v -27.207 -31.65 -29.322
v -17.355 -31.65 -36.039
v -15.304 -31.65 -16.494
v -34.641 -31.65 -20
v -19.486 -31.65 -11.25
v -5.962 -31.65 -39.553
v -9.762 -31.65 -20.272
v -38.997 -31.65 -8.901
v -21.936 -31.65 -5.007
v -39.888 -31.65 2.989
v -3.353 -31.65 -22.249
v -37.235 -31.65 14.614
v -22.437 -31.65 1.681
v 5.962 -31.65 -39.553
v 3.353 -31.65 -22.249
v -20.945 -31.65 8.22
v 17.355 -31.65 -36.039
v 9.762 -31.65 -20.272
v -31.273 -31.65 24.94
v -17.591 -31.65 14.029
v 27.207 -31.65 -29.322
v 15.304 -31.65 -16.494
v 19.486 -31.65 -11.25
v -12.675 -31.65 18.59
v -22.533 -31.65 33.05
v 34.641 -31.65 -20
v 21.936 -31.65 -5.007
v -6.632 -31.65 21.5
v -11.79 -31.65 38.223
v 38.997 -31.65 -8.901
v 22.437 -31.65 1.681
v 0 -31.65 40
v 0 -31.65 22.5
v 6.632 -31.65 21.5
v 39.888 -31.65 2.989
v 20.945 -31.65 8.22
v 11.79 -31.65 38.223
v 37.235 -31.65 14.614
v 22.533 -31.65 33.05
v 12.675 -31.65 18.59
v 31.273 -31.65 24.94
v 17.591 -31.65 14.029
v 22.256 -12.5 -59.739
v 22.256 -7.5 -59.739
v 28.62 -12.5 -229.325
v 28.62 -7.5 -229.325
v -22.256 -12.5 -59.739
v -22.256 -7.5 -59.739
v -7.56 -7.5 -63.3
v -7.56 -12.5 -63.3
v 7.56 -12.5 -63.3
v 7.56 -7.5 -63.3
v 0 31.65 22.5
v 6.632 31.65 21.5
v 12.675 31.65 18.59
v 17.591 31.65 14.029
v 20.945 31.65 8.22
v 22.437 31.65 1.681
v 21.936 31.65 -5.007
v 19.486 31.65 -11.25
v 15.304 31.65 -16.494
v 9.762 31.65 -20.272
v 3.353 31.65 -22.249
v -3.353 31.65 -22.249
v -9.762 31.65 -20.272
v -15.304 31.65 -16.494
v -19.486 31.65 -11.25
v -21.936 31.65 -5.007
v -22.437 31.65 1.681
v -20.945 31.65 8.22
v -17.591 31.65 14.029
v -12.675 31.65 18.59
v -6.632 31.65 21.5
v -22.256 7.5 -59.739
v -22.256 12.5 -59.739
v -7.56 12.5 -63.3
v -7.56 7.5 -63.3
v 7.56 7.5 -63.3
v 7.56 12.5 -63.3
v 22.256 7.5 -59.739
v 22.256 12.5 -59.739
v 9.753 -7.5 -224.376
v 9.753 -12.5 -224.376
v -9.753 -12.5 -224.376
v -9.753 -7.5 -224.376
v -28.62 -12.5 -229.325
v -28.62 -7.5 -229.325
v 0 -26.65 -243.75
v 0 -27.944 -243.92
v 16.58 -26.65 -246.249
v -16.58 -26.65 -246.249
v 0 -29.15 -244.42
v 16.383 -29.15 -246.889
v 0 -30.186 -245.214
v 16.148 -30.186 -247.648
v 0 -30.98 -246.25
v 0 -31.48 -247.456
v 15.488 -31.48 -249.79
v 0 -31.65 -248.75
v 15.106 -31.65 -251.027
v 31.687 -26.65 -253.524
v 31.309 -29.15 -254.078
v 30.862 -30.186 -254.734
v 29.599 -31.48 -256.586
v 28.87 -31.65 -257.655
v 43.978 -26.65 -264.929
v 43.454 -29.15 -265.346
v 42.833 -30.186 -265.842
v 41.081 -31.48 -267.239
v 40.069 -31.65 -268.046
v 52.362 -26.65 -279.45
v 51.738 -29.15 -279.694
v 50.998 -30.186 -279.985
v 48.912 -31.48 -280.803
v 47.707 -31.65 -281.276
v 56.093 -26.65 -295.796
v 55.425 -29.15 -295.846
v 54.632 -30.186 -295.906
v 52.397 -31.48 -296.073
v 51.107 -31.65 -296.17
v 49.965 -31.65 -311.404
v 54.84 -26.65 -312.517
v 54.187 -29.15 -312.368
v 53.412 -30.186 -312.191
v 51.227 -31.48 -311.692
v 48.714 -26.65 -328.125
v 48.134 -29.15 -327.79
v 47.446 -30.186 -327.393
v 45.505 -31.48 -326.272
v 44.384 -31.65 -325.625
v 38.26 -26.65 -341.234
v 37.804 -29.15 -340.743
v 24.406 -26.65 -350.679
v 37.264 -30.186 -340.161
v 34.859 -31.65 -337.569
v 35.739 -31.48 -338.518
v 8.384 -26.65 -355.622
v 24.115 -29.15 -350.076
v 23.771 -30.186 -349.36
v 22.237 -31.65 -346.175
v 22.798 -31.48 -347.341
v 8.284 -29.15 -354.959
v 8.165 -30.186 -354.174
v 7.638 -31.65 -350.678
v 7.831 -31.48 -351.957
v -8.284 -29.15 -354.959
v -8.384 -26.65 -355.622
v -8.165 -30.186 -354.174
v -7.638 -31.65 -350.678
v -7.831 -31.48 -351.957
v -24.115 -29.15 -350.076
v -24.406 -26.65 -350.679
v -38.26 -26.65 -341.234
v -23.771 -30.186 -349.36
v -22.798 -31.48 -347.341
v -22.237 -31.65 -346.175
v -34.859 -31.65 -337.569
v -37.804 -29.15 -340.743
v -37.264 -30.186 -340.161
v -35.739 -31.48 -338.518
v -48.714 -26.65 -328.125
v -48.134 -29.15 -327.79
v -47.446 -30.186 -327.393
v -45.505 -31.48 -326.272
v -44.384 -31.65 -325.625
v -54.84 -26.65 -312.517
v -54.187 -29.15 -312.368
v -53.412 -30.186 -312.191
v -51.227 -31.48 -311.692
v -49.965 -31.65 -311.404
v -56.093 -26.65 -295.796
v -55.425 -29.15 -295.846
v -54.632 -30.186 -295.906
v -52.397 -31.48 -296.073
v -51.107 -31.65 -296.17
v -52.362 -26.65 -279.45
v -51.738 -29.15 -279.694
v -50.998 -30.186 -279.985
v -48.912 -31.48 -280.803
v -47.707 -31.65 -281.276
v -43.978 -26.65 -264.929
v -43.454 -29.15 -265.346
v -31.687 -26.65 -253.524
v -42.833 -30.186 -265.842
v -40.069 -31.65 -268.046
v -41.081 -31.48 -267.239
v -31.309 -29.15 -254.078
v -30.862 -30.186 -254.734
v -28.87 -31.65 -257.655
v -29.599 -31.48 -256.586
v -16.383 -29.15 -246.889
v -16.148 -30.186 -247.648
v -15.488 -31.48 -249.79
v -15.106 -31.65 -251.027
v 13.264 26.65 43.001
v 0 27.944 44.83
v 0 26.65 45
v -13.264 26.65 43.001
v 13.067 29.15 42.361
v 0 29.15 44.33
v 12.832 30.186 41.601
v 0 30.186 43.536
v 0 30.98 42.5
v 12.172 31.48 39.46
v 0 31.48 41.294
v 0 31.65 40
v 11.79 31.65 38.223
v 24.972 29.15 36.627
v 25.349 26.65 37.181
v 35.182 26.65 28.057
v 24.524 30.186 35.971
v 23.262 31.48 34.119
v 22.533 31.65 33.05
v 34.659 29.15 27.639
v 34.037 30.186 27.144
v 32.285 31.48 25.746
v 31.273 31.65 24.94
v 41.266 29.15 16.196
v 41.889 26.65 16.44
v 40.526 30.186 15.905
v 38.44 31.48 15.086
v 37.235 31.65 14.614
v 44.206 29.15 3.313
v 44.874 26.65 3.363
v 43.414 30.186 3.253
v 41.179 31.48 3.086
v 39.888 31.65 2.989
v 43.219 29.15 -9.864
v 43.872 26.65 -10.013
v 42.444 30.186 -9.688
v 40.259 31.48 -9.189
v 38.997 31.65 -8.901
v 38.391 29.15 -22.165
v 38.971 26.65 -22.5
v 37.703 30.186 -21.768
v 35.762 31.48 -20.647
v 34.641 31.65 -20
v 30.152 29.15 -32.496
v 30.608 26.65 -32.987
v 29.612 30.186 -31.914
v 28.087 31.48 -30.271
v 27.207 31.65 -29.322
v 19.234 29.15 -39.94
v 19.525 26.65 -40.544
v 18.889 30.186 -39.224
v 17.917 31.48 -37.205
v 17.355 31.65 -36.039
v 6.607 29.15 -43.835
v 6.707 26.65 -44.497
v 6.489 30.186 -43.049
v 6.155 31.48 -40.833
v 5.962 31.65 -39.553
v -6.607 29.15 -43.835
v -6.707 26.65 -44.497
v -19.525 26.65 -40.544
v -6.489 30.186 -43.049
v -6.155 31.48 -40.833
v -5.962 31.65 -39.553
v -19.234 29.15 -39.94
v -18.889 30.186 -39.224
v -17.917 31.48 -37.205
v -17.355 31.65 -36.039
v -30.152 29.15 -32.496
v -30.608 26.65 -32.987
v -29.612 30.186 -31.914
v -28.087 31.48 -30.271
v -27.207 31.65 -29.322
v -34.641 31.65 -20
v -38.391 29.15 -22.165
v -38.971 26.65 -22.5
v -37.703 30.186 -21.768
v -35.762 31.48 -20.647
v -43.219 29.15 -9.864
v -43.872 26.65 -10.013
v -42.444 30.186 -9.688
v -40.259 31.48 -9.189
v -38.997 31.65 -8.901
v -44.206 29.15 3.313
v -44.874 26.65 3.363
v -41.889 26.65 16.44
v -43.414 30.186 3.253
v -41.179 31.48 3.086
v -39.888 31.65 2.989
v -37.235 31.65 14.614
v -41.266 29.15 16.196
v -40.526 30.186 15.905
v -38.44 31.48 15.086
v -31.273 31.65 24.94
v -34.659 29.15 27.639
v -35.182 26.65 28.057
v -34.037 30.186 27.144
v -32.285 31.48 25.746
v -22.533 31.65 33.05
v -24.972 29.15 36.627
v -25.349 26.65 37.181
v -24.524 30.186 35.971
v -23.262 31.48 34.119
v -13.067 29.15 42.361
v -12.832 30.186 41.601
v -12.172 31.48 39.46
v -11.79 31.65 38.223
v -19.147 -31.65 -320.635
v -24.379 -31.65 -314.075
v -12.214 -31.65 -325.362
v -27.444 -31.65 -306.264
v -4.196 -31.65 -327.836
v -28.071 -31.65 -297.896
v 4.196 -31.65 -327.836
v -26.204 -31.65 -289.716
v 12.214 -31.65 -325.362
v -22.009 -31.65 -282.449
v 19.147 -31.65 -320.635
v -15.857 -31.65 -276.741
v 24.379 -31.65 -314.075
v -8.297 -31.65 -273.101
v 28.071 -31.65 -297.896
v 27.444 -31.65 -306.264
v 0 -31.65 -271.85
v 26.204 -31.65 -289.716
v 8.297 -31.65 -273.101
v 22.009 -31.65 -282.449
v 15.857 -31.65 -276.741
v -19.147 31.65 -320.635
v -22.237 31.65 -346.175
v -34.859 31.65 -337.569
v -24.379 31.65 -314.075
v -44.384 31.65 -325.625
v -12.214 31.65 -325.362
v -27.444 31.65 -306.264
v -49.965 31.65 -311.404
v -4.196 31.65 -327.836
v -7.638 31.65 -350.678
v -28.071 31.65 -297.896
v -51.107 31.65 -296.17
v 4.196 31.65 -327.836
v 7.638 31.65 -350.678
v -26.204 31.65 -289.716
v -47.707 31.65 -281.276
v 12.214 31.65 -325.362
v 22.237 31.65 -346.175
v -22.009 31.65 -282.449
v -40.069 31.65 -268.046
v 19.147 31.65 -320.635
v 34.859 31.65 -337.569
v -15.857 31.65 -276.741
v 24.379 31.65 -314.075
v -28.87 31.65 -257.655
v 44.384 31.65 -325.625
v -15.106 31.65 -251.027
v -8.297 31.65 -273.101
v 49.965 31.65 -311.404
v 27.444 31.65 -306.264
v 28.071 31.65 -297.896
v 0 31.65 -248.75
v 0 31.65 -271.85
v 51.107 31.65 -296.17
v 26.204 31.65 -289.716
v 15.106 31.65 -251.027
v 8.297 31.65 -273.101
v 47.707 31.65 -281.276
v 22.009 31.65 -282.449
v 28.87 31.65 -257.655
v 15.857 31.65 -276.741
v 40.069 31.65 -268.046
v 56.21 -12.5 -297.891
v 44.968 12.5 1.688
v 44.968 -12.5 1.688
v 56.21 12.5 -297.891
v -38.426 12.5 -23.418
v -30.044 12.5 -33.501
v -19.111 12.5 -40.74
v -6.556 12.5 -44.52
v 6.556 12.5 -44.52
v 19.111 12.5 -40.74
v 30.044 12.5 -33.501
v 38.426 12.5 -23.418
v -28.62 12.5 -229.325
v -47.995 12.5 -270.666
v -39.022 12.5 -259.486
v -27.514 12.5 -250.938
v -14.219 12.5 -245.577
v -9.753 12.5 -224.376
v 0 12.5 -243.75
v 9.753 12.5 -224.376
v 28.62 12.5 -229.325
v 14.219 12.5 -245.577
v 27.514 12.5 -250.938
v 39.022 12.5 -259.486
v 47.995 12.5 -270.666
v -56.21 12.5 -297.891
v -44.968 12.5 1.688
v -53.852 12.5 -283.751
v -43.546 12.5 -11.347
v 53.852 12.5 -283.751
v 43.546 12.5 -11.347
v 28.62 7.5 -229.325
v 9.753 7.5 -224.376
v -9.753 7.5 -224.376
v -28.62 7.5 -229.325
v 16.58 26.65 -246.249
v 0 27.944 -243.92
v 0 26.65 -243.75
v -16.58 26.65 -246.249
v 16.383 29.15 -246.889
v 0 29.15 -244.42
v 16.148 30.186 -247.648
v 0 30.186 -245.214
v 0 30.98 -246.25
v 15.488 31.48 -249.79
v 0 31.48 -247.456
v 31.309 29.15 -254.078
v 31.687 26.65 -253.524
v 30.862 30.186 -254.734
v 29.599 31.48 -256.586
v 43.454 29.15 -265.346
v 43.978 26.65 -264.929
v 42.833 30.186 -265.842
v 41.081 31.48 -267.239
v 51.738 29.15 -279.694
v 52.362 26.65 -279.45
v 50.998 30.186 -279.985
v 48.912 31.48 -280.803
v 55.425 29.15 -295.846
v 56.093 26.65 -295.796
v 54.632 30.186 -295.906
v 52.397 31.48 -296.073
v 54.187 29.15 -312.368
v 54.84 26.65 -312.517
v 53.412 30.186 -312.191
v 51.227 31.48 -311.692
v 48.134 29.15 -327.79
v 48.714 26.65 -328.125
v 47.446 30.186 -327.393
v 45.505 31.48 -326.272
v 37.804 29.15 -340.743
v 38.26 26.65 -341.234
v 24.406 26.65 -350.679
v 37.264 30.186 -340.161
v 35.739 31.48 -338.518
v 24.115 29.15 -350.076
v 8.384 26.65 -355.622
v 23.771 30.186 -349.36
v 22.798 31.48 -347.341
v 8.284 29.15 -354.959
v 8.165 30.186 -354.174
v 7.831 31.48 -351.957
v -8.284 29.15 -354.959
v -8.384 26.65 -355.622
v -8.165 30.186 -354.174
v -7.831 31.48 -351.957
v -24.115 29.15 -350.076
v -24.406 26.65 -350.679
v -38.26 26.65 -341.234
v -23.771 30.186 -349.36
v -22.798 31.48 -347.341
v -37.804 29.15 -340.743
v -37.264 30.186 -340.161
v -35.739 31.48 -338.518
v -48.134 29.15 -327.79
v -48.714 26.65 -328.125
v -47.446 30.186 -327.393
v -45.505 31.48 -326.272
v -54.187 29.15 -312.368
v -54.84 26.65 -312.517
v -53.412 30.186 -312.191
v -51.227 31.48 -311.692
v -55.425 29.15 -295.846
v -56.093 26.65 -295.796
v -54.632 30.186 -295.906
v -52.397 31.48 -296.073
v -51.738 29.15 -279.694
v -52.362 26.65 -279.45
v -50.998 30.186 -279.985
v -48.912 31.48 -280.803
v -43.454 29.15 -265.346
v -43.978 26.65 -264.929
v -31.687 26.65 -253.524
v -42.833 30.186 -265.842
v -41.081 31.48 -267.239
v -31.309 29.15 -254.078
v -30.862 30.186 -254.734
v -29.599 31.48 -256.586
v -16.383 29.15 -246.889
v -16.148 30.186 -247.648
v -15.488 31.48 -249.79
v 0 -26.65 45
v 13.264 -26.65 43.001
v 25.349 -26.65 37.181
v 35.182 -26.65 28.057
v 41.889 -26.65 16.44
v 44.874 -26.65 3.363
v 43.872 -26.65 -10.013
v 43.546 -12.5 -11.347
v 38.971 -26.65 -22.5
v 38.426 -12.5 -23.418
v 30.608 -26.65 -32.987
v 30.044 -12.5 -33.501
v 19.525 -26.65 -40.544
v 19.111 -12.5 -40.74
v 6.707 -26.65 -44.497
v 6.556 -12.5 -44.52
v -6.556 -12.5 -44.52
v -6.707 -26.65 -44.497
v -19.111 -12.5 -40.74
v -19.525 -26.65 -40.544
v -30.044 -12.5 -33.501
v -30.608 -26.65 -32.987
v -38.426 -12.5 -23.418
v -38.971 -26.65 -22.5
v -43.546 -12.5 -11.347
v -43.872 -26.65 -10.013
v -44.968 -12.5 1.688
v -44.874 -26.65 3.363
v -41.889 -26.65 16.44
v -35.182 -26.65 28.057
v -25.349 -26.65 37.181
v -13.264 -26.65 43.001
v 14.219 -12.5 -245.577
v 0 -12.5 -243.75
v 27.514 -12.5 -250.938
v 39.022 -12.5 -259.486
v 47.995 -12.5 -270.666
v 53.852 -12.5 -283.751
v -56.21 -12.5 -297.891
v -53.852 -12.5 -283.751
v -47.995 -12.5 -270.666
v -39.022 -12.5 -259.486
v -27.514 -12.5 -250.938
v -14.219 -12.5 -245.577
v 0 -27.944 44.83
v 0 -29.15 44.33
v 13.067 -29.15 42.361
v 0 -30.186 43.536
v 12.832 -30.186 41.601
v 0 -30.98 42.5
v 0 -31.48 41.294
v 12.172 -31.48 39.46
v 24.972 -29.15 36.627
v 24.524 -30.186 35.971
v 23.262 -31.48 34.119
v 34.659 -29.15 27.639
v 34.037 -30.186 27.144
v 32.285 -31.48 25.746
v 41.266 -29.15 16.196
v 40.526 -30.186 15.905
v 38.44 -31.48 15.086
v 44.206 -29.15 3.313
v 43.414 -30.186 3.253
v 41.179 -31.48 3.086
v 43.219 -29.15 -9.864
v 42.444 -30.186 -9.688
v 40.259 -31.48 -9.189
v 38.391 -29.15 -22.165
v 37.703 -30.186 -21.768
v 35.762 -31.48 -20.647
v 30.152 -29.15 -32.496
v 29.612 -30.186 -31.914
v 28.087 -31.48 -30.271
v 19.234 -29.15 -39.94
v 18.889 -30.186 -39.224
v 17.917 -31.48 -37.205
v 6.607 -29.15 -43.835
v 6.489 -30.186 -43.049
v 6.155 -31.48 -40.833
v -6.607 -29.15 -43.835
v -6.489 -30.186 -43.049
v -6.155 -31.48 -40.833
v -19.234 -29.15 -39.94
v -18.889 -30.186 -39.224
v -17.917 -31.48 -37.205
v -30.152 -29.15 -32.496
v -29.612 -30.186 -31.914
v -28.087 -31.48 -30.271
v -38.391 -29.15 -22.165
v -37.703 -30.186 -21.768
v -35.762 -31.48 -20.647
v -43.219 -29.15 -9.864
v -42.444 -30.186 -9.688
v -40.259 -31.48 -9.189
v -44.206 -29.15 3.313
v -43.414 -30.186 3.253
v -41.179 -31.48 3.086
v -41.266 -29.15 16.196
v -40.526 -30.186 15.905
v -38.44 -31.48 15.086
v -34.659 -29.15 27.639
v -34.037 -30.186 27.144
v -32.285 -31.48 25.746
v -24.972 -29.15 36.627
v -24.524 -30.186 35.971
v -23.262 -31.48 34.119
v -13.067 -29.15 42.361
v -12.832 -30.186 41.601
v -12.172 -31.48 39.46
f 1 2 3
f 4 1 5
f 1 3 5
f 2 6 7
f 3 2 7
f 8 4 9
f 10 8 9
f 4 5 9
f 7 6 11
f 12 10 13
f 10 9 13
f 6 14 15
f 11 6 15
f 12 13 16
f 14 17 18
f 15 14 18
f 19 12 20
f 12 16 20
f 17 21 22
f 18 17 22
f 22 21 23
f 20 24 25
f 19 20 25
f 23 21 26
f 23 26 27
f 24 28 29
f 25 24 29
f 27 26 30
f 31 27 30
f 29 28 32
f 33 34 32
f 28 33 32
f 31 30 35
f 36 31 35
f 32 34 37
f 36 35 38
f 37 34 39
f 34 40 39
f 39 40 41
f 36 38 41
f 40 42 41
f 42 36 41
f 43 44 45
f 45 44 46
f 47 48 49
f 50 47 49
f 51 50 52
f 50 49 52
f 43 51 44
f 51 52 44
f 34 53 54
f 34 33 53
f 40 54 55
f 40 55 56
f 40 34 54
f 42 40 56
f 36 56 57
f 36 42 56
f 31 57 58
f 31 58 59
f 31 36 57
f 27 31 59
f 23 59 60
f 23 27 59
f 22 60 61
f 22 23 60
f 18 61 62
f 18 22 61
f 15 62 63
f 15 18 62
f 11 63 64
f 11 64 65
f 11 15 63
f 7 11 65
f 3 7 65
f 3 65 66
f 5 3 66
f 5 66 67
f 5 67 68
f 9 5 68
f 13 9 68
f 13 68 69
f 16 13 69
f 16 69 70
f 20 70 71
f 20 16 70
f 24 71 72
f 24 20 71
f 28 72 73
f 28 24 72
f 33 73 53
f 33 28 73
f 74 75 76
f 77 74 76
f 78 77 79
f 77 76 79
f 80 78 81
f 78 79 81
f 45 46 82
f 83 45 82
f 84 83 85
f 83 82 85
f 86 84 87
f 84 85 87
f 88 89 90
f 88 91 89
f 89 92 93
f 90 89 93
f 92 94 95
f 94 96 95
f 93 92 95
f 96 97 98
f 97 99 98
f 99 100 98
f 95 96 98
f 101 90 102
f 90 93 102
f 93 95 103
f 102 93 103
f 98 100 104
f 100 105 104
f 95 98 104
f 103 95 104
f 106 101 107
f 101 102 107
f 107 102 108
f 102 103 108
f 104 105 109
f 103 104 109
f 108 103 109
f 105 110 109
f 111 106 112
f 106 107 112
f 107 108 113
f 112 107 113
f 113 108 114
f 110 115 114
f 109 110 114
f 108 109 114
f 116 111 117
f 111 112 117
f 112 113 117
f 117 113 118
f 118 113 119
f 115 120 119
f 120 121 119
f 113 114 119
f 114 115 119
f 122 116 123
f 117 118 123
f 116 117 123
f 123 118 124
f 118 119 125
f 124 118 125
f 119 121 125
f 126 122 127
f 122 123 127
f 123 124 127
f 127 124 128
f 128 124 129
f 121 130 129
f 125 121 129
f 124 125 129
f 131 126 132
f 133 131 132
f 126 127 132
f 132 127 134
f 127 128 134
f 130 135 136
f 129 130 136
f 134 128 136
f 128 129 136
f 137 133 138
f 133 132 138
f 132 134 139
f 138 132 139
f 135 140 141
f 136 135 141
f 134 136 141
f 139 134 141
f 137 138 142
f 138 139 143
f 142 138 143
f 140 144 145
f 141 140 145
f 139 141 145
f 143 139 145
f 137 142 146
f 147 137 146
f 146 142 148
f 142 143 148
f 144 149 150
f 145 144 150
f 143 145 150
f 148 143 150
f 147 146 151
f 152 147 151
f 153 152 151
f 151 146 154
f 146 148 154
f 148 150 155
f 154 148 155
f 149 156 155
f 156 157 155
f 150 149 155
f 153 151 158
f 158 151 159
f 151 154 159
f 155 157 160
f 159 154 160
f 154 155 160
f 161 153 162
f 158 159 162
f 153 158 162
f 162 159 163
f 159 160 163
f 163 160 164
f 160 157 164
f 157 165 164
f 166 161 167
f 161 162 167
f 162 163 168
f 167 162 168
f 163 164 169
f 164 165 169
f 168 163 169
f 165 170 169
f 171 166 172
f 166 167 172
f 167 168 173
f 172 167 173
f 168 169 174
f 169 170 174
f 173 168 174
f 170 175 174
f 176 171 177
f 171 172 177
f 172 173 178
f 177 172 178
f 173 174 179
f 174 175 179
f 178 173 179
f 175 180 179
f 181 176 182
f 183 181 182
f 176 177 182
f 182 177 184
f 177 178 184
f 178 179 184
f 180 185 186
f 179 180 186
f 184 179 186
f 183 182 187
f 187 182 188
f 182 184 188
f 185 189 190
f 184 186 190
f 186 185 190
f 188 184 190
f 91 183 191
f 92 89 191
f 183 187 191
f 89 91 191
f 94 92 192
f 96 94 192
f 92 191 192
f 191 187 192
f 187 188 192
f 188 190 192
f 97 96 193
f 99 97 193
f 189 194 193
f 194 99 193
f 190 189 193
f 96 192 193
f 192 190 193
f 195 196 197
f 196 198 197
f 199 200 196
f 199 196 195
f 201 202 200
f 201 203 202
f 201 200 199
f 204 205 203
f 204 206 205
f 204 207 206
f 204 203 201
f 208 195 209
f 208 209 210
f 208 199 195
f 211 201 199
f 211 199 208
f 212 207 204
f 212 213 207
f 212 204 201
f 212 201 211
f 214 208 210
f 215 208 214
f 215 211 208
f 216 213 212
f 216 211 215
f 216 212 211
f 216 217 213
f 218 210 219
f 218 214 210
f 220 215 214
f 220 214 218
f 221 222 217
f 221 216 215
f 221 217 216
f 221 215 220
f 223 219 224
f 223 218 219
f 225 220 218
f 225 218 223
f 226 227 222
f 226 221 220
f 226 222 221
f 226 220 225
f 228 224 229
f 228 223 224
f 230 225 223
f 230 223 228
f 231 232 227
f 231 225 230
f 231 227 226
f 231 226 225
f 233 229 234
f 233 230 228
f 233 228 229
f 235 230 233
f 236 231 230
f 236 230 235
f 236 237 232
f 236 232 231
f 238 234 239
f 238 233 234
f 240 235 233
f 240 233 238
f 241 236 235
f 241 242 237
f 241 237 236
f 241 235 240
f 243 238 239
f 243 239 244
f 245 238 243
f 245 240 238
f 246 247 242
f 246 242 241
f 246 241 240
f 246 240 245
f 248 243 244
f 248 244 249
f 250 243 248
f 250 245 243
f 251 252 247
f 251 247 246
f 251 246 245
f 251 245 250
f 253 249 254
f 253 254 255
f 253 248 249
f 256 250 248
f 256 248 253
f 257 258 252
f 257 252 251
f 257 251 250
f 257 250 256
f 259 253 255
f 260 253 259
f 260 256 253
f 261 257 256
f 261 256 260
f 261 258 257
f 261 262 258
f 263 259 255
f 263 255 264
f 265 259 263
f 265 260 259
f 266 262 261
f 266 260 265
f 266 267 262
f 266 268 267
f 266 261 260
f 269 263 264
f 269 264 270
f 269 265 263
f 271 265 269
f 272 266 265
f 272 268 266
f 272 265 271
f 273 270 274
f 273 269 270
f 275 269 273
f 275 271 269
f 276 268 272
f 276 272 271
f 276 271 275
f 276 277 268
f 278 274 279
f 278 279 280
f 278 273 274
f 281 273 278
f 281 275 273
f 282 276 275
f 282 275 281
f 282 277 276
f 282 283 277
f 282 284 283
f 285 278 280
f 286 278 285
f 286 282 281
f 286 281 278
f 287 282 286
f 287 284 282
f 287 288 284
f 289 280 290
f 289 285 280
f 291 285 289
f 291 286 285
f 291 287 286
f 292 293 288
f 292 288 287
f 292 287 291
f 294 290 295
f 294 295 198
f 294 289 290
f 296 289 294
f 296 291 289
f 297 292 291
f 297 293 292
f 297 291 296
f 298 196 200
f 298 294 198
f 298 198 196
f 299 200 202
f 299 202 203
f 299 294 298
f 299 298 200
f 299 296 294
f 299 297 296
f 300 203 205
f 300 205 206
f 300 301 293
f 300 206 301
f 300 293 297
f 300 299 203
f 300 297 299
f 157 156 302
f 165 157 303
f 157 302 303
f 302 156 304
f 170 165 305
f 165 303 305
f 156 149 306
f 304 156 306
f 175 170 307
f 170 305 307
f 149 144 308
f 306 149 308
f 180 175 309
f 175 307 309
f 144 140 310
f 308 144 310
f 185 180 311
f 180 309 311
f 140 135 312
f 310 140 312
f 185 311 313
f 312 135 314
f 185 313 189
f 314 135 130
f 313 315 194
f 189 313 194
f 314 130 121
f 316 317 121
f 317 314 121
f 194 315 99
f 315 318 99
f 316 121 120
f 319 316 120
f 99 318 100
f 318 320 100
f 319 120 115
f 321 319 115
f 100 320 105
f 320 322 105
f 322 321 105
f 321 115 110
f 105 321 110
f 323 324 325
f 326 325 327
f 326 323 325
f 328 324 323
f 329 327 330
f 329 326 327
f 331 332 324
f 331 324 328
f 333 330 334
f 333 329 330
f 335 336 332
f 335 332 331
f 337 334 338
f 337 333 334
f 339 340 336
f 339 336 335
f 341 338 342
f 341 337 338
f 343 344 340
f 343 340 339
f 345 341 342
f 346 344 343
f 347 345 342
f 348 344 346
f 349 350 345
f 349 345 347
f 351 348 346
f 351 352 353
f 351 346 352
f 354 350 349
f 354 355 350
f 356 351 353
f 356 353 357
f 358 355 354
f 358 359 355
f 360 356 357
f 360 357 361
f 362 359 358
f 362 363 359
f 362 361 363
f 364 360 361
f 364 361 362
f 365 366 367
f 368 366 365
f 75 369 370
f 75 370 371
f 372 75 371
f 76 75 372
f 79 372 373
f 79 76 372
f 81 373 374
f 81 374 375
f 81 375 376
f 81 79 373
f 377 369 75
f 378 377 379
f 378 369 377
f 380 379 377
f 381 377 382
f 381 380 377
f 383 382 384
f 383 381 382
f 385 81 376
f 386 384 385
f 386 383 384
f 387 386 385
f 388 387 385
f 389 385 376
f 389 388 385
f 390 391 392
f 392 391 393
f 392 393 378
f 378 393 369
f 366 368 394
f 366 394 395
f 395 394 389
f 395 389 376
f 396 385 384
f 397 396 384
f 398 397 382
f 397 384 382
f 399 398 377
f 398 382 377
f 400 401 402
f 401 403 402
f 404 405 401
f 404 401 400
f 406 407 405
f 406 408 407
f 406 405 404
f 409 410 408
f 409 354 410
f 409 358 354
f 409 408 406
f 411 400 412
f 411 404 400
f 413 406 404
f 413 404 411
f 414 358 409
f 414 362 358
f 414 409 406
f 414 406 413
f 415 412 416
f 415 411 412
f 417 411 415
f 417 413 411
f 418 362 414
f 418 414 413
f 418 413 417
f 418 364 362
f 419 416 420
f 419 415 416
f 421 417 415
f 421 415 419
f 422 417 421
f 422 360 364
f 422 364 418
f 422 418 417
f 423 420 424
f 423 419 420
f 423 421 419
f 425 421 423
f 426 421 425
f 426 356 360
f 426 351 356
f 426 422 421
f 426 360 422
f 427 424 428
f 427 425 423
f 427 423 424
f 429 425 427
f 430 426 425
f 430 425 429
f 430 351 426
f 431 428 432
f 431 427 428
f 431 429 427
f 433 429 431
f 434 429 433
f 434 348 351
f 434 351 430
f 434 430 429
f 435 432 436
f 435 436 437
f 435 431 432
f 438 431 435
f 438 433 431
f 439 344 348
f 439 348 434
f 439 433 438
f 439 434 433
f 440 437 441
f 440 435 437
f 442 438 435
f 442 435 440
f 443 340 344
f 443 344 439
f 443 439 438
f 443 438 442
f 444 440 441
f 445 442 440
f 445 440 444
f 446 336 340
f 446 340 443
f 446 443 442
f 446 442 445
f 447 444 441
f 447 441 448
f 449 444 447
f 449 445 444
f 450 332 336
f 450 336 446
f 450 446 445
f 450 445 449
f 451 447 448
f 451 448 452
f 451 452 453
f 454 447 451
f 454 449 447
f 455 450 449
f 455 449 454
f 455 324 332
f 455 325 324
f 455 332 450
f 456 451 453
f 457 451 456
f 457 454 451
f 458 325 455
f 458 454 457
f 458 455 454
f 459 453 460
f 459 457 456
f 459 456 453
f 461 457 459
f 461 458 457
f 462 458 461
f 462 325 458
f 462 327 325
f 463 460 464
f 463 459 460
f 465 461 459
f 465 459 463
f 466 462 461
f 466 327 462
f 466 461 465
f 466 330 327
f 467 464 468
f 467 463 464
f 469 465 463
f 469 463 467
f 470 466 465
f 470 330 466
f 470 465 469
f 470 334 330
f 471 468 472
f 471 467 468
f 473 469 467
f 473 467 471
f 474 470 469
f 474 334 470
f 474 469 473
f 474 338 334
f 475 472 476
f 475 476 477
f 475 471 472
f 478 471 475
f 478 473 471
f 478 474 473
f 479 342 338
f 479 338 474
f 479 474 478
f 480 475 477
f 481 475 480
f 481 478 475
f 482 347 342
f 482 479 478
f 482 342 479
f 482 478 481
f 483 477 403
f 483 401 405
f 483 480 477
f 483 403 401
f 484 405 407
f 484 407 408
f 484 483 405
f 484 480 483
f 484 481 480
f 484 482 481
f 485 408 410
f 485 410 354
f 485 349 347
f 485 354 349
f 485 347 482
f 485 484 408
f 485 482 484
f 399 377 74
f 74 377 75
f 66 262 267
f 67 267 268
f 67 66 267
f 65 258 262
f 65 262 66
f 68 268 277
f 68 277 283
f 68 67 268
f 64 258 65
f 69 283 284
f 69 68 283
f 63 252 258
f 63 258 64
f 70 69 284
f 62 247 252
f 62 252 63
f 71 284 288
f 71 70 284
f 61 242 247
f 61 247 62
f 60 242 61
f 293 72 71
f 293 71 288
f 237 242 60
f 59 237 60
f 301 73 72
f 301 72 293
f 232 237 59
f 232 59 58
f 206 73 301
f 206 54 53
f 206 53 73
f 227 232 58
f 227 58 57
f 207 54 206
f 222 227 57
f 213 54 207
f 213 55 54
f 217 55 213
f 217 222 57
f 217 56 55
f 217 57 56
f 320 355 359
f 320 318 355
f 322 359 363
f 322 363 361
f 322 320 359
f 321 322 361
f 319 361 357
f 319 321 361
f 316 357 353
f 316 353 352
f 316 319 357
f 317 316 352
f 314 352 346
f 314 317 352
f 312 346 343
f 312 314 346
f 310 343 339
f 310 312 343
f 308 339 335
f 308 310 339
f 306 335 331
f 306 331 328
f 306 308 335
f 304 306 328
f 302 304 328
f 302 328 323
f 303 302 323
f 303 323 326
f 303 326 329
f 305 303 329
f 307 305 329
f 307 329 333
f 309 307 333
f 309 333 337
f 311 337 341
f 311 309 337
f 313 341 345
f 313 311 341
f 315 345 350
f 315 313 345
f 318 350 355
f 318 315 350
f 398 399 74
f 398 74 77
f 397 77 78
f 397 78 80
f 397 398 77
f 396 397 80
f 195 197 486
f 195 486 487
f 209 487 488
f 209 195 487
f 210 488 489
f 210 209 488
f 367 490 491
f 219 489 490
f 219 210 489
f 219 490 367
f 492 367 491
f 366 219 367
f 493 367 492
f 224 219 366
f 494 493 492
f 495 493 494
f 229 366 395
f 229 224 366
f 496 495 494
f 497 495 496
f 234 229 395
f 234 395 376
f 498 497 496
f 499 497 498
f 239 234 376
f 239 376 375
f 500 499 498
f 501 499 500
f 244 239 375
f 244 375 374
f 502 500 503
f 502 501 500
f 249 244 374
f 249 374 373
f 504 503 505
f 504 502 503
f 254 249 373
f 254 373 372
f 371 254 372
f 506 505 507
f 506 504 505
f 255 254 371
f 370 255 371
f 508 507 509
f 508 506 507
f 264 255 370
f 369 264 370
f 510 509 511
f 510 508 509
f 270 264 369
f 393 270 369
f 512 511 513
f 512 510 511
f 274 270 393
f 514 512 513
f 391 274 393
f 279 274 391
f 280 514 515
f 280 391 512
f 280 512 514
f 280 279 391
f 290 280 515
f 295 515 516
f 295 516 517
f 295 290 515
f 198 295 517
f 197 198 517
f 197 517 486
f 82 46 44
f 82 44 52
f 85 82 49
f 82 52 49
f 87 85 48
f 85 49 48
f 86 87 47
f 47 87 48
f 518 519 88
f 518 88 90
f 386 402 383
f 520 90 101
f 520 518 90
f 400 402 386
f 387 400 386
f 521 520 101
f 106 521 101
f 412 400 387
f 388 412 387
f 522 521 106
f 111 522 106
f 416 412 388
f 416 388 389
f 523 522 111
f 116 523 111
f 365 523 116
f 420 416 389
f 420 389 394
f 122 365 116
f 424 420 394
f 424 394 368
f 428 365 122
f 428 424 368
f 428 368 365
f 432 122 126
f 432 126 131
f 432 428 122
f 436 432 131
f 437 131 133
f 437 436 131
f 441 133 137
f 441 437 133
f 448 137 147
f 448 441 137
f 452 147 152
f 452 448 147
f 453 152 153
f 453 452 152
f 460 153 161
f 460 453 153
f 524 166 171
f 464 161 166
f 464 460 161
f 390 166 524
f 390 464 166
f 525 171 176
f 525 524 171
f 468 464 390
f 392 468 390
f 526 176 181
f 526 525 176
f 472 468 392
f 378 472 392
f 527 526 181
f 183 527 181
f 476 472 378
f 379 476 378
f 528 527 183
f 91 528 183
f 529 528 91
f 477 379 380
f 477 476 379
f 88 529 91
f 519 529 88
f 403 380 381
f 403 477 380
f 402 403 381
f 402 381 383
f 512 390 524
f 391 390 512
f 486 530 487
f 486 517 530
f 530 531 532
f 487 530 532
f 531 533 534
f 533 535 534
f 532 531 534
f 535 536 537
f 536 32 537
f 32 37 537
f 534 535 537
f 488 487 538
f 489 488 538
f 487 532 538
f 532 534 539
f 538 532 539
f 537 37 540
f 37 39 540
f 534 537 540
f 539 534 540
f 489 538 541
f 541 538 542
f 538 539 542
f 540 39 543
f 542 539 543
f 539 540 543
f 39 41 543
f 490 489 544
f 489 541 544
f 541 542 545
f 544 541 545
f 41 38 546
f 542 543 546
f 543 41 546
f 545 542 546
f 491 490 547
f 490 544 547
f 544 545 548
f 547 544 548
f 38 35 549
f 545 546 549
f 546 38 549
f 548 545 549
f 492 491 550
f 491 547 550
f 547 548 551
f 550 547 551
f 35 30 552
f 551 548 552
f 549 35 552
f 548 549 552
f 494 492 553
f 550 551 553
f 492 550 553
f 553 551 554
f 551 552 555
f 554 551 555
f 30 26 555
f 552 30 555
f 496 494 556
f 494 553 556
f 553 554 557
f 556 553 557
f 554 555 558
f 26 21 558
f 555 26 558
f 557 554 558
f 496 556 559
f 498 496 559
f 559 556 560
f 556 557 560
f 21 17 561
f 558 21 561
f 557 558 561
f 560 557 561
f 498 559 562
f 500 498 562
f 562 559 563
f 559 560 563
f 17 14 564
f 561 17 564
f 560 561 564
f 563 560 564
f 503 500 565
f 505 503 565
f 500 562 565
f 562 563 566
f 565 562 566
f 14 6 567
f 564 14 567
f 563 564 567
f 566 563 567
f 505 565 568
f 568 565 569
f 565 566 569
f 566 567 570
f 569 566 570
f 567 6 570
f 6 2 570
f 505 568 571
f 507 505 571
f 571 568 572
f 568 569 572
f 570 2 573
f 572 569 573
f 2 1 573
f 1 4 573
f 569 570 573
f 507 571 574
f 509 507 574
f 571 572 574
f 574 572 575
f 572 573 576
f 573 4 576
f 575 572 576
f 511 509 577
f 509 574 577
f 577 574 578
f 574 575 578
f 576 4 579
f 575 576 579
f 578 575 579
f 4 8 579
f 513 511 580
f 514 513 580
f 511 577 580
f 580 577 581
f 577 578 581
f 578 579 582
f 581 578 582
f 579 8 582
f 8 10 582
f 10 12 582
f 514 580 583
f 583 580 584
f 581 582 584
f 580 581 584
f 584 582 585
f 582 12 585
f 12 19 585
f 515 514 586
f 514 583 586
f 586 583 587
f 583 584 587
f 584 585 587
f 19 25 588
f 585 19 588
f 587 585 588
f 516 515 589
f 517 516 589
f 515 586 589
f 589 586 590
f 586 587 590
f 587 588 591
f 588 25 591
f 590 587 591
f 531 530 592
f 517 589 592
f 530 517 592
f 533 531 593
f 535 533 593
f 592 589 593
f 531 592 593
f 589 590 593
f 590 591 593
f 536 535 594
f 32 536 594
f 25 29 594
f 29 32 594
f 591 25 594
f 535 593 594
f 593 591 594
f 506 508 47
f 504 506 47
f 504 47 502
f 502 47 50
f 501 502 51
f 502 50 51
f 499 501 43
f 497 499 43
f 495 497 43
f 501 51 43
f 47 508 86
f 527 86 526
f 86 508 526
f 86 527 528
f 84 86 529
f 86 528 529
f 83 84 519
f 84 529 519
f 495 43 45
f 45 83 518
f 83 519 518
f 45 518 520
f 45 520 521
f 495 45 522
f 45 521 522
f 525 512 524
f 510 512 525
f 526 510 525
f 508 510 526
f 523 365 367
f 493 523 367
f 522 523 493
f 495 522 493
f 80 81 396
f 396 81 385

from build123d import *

# Parameters (mm, degrees)
SKETCH1_R             = 45
SKETCH1_R_2           = 22.5
BOSS_EXTRUDE1_DEPTH   = 31.65
SKETCH1_R_3           = 56.25
SKETCH1_R_4           = 28.15
BOSS_EXTRUDE1_2_DEPTH = 31.65
BOSS_EXTRUDE2_DEPTH   = 12.5
CUT_EXTRUDE1_DEPTH    = 5
CUT_EXTRUDE2_START    = -5
CUT_EXTRUDE2_DEPTH    = 5
FILLET1_R             = 5


with BuildPart() as part:
    # Sketch1 → Boss-Extrude1 (new, symmetric)
    with BuildSketch(Plane(origin=(0, 0, 0), x_dir=(1, 0, 0), z_dir=(0, 1, 0))):
        with Locations(Location((0, 0, 0), (0, 0, 270))):
            Circle(SKETCH1_R)
        with Locations(Location((0, 0, 0), (0, 0, 270))):
            Circle(SKETCH1_R_2, mode=Mode.SUBTRACT)
    extrude(amount=BOSS_EXTRUDE1_DEPTH, both=True)



with BuildPart() as body_2:
    # Sketch1 → Boss-Extrude1 2 (new, symmetric)
    with BuildSketch(Plane(origin=(0, 0, 0), x_dir=(1, 0, 0), z_dir=(0, 1, 0))):
        with Locations(Location((0, 300, 0), (0, 0, 270))):
            Circle(SKETCH1_R_3)
        with Locations(Location((0, 300, 0), (0, 0, 270))):
            Circle(SKETCH1_R_4, mode=Mode.SUBTRACT)
    extrude(amount=BOSS_EXTRUDE1_2_DEPTH, both=True)


with BuildPart() as part_1:
    add(part.part)

    add(body_2.part)  # Boss-Extrude2 merges body 2
    # Sketch2 → Boss-Extrude2 (add, symmetric)
    with BuildSketch(Plane(origin=(0, 0, 0), x_dir=(1, 0, 0), z_dir=(0, 1, 0))):
        with BuildLine():
            Line((-56.210435304, 297.890625), (-44.968348244, -1.6875))
            ThreePointArc((-44.968348244, -1.6875), (0, 45), (44.968348244, -1.6875))
            Line((44.968348244, -1.6875), (56.210435304, 297.890625))
            ThreePointArc((56.210435304, 297.890625), (0, 243.75), (-56.210435304, 297.890625))
        make_face()
    extrude(amount=BOSS_EXTRUDE2_DEPTH, both=True)

    # Sketch3 → Cut-Extrude1 (cut)
    with BuildSketch(Plane(origin=(0, 12.5, 0), x_dir=(1, 0, 0), z_dir=(0, 1, 0))):
        with BuildLine():
            Line((-28.619814412, 229.324907336), (-22.255863805, 59.73892388))
            ThreePointArc((-22.255863805, 59.73892388), (0, 63.75), (22.255863805, 59.73892388))
            Line((22.255863805, 59.73892388), (28.619814412, 229.324907336))
            ThreePointArc((28.619814412, 229.324907336), (0, 223.75), (-28.619814412, 229.324907336))
        make_face()
    extrude(amount=-CUT_EXTRUDE1_DEPTH, mode=Mode.SUBTRACT)

    # Sketch4 → Cut-Extrude2 (cut)
    with BuildSketch(Plane.XZ.offset(12.5).offset(CUT_EXTRUDE2_START)):
        with BuildLine():
            Line((22.255863805, -59.73892388), (28.619814412, -229.324907336))
            ThreePointArc((28.619814412, -229.324907336), (0, -223.75), (-28.619814412, -229.324907336))
            Line((-28.619814412, -229.324907336), (-22.255863805, -59.73892388))
            ThreePointArc((-22.255863805, -59.73892388), (0, -63.75), (22.255863805, -59.73892388))
        make_face()
    extrude(amount=CUT_EXTRUDE2_DEPTH, mode=Mode.SUBTRACT)

    # Fillet1
    fillet1_edges = [part_1.edges().sort_by_distance(p)[0] for p in [
        (0, -31.65, -45),
        (0, 31.65, -356.25),
        (0, -31.65, -356.25),
        (0, 31.65, -45),
    ]]
    fillet(fillet1_edges, radius=FILLET1_R)


solid = part_1.part
